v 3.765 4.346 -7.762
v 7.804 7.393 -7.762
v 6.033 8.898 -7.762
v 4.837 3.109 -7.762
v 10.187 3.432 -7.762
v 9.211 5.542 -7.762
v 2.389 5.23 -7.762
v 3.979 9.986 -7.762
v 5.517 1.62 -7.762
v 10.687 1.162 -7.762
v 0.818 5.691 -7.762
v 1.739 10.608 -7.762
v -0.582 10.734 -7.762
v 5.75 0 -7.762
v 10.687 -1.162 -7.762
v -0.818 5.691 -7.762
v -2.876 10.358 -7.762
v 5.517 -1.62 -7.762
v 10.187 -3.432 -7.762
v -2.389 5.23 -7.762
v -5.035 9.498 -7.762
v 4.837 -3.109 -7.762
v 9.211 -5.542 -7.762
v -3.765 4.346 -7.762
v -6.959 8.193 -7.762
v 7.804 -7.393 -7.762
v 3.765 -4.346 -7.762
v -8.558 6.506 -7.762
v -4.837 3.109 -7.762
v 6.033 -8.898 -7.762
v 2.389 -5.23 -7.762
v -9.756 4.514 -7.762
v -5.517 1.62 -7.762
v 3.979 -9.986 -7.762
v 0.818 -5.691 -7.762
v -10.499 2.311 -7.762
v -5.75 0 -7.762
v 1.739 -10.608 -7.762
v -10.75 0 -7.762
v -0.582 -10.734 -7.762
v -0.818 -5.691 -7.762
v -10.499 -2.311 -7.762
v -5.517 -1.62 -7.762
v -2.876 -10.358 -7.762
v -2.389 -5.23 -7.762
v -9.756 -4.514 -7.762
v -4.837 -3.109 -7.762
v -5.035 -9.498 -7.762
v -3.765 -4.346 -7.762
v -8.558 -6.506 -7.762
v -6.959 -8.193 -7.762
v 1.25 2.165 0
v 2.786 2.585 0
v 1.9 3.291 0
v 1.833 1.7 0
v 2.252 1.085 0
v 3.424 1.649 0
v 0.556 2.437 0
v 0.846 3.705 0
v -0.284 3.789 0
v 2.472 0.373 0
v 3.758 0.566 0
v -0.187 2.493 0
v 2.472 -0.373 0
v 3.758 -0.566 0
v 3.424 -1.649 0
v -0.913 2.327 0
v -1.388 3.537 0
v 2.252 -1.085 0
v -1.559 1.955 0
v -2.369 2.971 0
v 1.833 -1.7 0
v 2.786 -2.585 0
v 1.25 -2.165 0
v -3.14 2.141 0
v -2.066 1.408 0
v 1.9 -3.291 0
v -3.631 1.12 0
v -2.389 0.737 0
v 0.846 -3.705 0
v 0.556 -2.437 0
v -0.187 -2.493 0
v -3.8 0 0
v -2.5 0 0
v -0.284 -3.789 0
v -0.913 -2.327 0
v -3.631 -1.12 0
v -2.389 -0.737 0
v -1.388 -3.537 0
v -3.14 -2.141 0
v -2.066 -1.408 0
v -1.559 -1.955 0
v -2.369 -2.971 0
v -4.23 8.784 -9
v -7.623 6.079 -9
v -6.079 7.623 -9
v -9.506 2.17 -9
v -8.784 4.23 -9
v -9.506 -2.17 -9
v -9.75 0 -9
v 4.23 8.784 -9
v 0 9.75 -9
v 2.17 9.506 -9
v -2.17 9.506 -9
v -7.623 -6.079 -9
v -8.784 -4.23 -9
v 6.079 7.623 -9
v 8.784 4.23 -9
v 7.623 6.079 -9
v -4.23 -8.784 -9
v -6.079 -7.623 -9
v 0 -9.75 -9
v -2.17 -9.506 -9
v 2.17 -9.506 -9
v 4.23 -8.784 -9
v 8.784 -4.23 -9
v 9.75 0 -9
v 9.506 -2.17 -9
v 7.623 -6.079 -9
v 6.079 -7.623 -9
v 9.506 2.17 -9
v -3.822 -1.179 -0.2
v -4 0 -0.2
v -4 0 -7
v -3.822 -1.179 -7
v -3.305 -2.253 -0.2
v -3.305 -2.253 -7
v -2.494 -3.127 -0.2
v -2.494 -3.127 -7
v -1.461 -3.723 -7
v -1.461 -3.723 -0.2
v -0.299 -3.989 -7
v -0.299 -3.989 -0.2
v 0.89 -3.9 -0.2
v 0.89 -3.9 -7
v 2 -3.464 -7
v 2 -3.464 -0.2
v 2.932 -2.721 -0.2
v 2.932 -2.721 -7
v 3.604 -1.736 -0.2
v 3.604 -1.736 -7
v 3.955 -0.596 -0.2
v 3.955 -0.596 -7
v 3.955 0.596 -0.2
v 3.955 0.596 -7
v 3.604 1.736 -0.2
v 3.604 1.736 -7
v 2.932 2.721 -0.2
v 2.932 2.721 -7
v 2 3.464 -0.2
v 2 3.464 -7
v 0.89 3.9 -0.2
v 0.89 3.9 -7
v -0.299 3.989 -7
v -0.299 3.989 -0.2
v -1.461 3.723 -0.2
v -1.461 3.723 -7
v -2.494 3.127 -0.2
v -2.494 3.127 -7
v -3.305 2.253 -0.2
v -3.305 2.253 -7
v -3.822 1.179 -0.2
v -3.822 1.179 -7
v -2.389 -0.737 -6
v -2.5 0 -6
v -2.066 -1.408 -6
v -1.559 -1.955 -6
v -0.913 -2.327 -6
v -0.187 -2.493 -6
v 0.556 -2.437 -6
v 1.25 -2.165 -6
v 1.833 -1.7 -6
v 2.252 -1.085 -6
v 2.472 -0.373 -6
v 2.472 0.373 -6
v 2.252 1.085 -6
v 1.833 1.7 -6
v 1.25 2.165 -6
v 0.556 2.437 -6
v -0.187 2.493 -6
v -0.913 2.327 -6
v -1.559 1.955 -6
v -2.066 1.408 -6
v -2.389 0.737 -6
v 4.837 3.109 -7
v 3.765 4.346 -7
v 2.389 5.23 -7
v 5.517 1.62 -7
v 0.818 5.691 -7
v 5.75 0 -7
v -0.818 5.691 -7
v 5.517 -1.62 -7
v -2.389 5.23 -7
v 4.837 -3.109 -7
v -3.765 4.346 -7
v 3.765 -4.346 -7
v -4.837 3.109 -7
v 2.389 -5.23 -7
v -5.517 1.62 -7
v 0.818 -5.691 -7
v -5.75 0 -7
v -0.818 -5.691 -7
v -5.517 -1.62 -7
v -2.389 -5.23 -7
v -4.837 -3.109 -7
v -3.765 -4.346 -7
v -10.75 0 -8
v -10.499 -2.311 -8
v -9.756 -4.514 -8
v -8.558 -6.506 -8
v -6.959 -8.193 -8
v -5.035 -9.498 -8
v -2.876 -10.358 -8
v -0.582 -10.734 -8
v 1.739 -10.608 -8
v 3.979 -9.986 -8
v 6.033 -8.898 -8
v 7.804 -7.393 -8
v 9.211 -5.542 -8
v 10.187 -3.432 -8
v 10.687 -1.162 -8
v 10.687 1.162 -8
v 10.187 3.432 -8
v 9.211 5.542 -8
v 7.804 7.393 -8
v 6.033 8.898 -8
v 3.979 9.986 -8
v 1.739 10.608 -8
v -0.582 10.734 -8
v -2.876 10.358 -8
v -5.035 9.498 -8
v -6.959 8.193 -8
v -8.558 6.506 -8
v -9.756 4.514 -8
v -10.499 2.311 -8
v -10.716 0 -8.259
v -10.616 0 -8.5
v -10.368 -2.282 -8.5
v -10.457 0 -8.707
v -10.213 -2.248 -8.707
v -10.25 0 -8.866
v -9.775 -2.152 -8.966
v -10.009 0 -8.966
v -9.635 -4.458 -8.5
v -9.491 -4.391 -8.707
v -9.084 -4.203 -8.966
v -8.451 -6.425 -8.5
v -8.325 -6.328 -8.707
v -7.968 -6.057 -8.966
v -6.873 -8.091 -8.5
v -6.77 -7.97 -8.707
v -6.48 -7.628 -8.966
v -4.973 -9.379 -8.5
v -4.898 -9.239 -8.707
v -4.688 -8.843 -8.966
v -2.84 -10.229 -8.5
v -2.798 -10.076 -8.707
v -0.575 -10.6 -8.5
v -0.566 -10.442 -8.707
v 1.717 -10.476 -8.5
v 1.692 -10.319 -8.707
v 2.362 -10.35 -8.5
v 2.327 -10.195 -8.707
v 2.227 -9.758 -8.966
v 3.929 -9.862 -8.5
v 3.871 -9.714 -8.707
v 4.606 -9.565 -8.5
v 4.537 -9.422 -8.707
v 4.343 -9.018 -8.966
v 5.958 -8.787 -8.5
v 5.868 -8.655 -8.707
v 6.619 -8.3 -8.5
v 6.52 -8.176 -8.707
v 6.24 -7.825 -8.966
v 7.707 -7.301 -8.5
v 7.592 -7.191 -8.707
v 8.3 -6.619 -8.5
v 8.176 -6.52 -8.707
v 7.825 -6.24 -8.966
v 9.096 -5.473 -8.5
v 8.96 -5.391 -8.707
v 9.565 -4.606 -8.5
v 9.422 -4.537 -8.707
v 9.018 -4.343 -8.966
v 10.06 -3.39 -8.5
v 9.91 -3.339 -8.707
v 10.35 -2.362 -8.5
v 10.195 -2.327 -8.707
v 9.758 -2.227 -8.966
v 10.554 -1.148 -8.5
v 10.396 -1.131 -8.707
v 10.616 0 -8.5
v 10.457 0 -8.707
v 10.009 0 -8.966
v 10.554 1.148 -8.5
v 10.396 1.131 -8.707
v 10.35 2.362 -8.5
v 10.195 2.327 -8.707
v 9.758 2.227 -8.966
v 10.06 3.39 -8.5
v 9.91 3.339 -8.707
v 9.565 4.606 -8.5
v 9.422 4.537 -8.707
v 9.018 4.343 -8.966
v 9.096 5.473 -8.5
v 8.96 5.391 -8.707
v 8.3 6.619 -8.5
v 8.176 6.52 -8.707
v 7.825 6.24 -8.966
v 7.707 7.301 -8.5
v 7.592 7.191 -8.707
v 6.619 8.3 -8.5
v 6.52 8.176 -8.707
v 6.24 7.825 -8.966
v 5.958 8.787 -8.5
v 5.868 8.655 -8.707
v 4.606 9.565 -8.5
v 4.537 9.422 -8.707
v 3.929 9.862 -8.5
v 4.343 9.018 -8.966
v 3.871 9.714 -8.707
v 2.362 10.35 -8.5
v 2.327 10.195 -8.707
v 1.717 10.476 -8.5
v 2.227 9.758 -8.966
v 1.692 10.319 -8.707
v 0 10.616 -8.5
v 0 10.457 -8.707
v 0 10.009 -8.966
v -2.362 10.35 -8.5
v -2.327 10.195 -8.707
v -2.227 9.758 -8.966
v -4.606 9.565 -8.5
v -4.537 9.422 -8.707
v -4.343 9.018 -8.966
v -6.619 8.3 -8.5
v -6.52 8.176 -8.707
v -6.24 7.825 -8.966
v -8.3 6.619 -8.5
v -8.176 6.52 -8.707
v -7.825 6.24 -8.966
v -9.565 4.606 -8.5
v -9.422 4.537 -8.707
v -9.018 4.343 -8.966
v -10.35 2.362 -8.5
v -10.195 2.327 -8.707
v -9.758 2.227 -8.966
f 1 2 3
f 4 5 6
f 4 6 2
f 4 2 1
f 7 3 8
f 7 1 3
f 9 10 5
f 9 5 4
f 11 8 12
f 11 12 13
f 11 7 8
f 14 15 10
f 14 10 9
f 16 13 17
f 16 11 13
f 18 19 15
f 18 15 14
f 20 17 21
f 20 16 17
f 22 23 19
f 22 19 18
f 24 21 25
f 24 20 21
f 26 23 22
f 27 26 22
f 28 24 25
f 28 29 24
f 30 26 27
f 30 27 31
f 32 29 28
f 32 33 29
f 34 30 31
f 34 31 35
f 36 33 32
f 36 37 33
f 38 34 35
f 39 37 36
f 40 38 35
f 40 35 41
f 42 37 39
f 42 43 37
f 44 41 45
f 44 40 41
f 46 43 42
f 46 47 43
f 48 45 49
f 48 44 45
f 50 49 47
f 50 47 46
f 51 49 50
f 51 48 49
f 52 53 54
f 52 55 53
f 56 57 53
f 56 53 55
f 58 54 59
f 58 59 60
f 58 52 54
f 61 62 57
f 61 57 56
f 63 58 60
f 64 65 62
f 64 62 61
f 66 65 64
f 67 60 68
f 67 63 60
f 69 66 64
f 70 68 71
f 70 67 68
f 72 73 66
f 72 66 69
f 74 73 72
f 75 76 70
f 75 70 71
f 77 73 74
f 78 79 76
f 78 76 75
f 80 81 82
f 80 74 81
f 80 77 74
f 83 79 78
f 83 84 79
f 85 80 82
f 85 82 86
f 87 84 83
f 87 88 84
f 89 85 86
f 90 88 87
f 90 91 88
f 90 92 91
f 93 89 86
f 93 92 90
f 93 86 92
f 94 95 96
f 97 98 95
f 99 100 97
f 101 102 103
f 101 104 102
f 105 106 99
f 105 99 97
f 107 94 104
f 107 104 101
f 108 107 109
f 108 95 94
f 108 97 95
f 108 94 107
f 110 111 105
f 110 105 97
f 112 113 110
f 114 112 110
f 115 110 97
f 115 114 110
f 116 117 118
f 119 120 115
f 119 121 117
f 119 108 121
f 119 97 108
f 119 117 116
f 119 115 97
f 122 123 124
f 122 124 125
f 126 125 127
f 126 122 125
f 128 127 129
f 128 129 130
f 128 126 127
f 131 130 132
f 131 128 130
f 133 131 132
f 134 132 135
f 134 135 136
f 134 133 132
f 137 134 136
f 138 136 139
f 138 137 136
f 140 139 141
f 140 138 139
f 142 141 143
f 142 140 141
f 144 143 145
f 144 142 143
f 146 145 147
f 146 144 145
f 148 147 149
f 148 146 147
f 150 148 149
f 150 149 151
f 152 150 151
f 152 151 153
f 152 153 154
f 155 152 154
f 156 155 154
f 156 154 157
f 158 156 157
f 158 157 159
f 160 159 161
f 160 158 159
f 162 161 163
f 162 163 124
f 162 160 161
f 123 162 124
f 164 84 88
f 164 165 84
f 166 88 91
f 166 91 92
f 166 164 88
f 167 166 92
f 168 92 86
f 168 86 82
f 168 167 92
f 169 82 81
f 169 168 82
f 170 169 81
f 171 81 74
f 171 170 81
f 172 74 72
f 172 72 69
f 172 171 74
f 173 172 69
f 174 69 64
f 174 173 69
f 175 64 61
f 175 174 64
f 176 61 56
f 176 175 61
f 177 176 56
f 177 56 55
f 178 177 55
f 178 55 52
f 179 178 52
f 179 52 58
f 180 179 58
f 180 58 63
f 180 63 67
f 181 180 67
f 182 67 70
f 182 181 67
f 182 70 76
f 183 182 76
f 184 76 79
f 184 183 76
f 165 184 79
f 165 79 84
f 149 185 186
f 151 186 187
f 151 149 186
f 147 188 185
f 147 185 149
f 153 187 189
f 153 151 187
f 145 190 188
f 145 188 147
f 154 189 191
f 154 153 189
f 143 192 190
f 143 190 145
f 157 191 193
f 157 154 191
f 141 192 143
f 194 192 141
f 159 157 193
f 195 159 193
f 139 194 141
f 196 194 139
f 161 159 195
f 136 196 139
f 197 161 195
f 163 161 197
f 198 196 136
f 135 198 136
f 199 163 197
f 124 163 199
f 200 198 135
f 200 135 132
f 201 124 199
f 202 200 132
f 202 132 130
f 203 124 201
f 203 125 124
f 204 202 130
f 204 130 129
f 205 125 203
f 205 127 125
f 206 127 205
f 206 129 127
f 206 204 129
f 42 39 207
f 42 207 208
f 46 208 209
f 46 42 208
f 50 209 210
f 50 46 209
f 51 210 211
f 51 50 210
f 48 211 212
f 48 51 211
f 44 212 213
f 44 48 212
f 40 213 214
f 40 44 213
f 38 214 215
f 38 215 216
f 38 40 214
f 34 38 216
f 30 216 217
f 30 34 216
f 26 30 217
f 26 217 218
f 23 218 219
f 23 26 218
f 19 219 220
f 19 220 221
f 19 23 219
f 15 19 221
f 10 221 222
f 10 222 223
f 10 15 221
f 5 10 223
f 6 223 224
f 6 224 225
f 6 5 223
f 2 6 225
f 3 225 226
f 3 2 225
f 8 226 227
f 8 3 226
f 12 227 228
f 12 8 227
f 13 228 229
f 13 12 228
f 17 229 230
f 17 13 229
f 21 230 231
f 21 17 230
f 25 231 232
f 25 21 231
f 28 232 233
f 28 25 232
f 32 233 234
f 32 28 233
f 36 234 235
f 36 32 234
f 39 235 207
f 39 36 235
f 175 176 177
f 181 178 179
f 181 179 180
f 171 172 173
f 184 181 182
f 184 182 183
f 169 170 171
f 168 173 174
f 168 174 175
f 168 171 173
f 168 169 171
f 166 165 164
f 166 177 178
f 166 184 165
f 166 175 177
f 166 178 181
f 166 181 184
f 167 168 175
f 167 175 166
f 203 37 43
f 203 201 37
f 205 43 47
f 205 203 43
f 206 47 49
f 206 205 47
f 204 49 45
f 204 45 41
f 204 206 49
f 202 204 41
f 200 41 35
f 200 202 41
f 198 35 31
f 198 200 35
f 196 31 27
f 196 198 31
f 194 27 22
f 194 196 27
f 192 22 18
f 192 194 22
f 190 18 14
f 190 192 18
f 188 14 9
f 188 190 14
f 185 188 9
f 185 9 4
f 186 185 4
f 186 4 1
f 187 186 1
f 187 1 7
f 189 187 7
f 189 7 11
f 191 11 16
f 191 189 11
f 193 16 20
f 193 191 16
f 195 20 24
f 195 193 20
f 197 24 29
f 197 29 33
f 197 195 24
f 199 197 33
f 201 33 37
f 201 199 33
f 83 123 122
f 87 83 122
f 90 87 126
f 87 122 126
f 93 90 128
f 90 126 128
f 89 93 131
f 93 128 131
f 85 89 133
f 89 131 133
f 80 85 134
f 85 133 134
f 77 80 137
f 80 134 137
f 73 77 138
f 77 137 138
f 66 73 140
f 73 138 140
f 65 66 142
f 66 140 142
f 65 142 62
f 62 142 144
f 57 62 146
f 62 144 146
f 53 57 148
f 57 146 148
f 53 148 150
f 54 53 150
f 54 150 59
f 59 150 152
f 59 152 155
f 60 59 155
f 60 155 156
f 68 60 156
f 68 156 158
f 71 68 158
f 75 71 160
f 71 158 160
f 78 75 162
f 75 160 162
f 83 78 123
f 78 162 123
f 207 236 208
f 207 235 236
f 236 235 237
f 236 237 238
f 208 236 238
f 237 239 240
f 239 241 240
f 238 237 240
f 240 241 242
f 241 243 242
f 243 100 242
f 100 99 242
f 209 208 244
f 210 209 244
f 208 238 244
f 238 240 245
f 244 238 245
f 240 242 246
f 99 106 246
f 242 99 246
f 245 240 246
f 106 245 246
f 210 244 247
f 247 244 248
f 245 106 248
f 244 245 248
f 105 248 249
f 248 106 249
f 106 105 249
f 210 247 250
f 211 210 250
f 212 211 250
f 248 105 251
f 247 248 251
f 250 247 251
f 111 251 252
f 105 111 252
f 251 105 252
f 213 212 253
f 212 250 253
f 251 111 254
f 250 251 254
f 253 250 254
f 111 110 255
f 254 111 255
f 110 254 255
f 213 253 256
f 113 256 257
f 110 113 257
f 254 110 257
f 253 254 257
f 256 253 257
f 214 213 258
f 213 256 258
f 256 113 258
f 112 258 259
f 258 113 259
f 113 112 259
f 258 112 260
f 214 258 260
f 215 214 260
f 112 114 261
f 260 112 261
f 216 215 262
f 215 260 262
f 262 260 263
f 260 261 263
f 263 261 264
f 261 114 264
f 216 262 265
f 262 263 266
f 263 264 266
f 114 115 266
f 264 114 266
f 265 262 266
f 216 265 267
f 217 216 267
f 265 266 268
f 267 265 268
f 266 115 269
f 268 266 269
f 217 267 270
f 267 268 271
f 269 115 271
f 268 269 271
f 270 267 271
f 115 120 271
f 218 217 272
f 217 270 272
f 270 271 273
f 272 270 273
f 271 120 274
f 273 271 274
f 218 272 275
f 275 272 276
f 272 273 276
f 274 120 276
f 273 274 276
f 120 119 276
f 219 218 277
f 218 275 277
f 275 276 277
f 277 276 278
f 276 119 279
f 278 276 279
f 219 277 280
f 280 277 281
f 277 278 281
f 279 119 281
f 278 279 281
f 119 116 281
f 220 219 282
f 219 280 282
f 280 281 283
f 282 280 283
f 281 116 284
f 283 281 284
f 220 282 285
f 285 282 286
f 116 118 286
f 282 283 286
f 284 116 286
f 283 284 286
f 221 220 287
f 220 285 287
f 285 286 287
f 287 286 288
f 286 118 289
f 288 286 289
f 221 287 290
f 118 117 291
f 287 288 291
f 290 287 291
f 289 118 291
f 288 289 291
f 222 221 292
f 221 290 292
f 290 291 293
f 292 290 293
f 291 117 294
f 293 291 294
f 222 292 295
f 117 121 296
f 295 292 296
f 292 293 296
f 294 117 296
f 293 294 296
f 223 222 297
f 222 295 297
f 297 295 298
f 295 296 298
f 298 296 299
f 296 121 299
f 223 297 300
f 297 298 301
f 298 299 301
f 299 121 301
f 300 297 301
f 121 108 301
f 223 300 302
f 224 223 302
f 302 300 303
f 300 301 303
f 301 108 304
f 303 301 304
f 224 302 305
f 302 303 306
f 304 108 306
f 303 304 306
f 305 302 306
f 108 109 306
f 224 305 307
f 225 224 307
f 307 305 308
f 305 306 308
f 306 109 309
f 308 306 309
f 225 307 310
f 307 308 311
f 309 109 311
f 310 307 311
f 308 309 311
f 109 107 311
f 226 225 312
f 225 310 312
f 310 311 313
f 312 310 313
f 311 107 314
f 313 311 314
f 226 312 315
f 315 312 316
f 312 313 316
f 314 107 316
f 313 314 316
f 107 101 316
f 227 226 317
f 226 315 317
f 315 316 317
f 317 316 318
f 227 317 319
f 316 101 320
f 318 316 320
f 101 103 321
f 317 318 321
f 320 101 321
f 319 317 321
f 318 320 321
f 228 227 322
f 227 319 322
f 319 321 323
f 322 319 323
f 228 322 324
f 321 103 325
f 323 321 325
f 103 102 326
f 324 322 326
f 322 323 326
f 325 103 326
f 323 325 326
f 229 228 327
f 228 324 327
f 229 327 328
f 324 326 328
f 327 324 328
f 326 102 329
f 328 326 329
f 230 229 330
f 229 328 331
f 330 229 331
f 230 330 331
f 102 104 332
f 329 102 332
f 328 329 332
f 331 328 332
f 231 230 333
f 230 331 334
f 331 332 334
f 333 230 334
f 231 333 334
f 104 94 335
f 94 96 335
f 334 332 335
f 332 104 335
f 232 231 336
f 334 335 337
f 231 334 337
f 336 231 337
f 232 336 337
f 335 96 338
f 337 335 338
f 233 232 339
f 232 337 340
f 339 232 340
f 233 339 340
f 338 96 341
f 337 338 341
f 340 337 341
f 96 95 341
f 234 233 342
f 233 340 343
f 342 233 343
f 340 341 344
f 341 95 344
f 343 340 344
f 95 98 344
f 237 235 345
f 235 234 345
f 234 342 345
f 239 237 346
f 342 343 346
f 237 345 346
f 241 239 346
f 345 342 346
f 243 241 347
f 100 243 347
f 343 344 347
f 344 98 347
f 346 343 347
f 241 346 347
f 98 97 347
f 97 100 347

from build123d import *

# Parameters (mm, degrees)
CHAMFER3_SIZE = 0.2
FILLET2_R     = 1


with BuildPart() as part:
    # Sketch1 → Revolve1 (revolve)
    with BuildSketch(Plane(origin=(0, 0, 0), x_dir=(1, 0, 0), z_dir=(0, 1, 0)), mode=Mode.PRIVATE) as revolve1_sk:
        Polygon((4, 0), (2.5, 0), (2.5, 6), (0, 6), (0, 9), (10.75, 9), (10.75, 7.762245205), (5.75, 7.762245205), (5.75, 7), (4, 7), align=None)
    revolve(revolve1_sk.sketch.rotate(Axis((0, 0, -9.865928584), (0, 0, 1)), 180), axis=Axis((0, 0, -9.865928584), (0, 0, 1)))

    # Chamfer3
    chamfer3_edges = [part.edges().sort_by_distance(p)[0] for p in [
        (4, 0, 0),
    ]]
    chamfer(chamfer3_edges, length=CHAMFER3_SIZE)

    # Fillet2
    fillet2_edges = [part.edges().sort_by_distance(p)[0] for p in [
        (10.75, 0, -9),
    ]]
    fillet(fillet2_edges, radius=FILLET2_R)


solid = part.part
